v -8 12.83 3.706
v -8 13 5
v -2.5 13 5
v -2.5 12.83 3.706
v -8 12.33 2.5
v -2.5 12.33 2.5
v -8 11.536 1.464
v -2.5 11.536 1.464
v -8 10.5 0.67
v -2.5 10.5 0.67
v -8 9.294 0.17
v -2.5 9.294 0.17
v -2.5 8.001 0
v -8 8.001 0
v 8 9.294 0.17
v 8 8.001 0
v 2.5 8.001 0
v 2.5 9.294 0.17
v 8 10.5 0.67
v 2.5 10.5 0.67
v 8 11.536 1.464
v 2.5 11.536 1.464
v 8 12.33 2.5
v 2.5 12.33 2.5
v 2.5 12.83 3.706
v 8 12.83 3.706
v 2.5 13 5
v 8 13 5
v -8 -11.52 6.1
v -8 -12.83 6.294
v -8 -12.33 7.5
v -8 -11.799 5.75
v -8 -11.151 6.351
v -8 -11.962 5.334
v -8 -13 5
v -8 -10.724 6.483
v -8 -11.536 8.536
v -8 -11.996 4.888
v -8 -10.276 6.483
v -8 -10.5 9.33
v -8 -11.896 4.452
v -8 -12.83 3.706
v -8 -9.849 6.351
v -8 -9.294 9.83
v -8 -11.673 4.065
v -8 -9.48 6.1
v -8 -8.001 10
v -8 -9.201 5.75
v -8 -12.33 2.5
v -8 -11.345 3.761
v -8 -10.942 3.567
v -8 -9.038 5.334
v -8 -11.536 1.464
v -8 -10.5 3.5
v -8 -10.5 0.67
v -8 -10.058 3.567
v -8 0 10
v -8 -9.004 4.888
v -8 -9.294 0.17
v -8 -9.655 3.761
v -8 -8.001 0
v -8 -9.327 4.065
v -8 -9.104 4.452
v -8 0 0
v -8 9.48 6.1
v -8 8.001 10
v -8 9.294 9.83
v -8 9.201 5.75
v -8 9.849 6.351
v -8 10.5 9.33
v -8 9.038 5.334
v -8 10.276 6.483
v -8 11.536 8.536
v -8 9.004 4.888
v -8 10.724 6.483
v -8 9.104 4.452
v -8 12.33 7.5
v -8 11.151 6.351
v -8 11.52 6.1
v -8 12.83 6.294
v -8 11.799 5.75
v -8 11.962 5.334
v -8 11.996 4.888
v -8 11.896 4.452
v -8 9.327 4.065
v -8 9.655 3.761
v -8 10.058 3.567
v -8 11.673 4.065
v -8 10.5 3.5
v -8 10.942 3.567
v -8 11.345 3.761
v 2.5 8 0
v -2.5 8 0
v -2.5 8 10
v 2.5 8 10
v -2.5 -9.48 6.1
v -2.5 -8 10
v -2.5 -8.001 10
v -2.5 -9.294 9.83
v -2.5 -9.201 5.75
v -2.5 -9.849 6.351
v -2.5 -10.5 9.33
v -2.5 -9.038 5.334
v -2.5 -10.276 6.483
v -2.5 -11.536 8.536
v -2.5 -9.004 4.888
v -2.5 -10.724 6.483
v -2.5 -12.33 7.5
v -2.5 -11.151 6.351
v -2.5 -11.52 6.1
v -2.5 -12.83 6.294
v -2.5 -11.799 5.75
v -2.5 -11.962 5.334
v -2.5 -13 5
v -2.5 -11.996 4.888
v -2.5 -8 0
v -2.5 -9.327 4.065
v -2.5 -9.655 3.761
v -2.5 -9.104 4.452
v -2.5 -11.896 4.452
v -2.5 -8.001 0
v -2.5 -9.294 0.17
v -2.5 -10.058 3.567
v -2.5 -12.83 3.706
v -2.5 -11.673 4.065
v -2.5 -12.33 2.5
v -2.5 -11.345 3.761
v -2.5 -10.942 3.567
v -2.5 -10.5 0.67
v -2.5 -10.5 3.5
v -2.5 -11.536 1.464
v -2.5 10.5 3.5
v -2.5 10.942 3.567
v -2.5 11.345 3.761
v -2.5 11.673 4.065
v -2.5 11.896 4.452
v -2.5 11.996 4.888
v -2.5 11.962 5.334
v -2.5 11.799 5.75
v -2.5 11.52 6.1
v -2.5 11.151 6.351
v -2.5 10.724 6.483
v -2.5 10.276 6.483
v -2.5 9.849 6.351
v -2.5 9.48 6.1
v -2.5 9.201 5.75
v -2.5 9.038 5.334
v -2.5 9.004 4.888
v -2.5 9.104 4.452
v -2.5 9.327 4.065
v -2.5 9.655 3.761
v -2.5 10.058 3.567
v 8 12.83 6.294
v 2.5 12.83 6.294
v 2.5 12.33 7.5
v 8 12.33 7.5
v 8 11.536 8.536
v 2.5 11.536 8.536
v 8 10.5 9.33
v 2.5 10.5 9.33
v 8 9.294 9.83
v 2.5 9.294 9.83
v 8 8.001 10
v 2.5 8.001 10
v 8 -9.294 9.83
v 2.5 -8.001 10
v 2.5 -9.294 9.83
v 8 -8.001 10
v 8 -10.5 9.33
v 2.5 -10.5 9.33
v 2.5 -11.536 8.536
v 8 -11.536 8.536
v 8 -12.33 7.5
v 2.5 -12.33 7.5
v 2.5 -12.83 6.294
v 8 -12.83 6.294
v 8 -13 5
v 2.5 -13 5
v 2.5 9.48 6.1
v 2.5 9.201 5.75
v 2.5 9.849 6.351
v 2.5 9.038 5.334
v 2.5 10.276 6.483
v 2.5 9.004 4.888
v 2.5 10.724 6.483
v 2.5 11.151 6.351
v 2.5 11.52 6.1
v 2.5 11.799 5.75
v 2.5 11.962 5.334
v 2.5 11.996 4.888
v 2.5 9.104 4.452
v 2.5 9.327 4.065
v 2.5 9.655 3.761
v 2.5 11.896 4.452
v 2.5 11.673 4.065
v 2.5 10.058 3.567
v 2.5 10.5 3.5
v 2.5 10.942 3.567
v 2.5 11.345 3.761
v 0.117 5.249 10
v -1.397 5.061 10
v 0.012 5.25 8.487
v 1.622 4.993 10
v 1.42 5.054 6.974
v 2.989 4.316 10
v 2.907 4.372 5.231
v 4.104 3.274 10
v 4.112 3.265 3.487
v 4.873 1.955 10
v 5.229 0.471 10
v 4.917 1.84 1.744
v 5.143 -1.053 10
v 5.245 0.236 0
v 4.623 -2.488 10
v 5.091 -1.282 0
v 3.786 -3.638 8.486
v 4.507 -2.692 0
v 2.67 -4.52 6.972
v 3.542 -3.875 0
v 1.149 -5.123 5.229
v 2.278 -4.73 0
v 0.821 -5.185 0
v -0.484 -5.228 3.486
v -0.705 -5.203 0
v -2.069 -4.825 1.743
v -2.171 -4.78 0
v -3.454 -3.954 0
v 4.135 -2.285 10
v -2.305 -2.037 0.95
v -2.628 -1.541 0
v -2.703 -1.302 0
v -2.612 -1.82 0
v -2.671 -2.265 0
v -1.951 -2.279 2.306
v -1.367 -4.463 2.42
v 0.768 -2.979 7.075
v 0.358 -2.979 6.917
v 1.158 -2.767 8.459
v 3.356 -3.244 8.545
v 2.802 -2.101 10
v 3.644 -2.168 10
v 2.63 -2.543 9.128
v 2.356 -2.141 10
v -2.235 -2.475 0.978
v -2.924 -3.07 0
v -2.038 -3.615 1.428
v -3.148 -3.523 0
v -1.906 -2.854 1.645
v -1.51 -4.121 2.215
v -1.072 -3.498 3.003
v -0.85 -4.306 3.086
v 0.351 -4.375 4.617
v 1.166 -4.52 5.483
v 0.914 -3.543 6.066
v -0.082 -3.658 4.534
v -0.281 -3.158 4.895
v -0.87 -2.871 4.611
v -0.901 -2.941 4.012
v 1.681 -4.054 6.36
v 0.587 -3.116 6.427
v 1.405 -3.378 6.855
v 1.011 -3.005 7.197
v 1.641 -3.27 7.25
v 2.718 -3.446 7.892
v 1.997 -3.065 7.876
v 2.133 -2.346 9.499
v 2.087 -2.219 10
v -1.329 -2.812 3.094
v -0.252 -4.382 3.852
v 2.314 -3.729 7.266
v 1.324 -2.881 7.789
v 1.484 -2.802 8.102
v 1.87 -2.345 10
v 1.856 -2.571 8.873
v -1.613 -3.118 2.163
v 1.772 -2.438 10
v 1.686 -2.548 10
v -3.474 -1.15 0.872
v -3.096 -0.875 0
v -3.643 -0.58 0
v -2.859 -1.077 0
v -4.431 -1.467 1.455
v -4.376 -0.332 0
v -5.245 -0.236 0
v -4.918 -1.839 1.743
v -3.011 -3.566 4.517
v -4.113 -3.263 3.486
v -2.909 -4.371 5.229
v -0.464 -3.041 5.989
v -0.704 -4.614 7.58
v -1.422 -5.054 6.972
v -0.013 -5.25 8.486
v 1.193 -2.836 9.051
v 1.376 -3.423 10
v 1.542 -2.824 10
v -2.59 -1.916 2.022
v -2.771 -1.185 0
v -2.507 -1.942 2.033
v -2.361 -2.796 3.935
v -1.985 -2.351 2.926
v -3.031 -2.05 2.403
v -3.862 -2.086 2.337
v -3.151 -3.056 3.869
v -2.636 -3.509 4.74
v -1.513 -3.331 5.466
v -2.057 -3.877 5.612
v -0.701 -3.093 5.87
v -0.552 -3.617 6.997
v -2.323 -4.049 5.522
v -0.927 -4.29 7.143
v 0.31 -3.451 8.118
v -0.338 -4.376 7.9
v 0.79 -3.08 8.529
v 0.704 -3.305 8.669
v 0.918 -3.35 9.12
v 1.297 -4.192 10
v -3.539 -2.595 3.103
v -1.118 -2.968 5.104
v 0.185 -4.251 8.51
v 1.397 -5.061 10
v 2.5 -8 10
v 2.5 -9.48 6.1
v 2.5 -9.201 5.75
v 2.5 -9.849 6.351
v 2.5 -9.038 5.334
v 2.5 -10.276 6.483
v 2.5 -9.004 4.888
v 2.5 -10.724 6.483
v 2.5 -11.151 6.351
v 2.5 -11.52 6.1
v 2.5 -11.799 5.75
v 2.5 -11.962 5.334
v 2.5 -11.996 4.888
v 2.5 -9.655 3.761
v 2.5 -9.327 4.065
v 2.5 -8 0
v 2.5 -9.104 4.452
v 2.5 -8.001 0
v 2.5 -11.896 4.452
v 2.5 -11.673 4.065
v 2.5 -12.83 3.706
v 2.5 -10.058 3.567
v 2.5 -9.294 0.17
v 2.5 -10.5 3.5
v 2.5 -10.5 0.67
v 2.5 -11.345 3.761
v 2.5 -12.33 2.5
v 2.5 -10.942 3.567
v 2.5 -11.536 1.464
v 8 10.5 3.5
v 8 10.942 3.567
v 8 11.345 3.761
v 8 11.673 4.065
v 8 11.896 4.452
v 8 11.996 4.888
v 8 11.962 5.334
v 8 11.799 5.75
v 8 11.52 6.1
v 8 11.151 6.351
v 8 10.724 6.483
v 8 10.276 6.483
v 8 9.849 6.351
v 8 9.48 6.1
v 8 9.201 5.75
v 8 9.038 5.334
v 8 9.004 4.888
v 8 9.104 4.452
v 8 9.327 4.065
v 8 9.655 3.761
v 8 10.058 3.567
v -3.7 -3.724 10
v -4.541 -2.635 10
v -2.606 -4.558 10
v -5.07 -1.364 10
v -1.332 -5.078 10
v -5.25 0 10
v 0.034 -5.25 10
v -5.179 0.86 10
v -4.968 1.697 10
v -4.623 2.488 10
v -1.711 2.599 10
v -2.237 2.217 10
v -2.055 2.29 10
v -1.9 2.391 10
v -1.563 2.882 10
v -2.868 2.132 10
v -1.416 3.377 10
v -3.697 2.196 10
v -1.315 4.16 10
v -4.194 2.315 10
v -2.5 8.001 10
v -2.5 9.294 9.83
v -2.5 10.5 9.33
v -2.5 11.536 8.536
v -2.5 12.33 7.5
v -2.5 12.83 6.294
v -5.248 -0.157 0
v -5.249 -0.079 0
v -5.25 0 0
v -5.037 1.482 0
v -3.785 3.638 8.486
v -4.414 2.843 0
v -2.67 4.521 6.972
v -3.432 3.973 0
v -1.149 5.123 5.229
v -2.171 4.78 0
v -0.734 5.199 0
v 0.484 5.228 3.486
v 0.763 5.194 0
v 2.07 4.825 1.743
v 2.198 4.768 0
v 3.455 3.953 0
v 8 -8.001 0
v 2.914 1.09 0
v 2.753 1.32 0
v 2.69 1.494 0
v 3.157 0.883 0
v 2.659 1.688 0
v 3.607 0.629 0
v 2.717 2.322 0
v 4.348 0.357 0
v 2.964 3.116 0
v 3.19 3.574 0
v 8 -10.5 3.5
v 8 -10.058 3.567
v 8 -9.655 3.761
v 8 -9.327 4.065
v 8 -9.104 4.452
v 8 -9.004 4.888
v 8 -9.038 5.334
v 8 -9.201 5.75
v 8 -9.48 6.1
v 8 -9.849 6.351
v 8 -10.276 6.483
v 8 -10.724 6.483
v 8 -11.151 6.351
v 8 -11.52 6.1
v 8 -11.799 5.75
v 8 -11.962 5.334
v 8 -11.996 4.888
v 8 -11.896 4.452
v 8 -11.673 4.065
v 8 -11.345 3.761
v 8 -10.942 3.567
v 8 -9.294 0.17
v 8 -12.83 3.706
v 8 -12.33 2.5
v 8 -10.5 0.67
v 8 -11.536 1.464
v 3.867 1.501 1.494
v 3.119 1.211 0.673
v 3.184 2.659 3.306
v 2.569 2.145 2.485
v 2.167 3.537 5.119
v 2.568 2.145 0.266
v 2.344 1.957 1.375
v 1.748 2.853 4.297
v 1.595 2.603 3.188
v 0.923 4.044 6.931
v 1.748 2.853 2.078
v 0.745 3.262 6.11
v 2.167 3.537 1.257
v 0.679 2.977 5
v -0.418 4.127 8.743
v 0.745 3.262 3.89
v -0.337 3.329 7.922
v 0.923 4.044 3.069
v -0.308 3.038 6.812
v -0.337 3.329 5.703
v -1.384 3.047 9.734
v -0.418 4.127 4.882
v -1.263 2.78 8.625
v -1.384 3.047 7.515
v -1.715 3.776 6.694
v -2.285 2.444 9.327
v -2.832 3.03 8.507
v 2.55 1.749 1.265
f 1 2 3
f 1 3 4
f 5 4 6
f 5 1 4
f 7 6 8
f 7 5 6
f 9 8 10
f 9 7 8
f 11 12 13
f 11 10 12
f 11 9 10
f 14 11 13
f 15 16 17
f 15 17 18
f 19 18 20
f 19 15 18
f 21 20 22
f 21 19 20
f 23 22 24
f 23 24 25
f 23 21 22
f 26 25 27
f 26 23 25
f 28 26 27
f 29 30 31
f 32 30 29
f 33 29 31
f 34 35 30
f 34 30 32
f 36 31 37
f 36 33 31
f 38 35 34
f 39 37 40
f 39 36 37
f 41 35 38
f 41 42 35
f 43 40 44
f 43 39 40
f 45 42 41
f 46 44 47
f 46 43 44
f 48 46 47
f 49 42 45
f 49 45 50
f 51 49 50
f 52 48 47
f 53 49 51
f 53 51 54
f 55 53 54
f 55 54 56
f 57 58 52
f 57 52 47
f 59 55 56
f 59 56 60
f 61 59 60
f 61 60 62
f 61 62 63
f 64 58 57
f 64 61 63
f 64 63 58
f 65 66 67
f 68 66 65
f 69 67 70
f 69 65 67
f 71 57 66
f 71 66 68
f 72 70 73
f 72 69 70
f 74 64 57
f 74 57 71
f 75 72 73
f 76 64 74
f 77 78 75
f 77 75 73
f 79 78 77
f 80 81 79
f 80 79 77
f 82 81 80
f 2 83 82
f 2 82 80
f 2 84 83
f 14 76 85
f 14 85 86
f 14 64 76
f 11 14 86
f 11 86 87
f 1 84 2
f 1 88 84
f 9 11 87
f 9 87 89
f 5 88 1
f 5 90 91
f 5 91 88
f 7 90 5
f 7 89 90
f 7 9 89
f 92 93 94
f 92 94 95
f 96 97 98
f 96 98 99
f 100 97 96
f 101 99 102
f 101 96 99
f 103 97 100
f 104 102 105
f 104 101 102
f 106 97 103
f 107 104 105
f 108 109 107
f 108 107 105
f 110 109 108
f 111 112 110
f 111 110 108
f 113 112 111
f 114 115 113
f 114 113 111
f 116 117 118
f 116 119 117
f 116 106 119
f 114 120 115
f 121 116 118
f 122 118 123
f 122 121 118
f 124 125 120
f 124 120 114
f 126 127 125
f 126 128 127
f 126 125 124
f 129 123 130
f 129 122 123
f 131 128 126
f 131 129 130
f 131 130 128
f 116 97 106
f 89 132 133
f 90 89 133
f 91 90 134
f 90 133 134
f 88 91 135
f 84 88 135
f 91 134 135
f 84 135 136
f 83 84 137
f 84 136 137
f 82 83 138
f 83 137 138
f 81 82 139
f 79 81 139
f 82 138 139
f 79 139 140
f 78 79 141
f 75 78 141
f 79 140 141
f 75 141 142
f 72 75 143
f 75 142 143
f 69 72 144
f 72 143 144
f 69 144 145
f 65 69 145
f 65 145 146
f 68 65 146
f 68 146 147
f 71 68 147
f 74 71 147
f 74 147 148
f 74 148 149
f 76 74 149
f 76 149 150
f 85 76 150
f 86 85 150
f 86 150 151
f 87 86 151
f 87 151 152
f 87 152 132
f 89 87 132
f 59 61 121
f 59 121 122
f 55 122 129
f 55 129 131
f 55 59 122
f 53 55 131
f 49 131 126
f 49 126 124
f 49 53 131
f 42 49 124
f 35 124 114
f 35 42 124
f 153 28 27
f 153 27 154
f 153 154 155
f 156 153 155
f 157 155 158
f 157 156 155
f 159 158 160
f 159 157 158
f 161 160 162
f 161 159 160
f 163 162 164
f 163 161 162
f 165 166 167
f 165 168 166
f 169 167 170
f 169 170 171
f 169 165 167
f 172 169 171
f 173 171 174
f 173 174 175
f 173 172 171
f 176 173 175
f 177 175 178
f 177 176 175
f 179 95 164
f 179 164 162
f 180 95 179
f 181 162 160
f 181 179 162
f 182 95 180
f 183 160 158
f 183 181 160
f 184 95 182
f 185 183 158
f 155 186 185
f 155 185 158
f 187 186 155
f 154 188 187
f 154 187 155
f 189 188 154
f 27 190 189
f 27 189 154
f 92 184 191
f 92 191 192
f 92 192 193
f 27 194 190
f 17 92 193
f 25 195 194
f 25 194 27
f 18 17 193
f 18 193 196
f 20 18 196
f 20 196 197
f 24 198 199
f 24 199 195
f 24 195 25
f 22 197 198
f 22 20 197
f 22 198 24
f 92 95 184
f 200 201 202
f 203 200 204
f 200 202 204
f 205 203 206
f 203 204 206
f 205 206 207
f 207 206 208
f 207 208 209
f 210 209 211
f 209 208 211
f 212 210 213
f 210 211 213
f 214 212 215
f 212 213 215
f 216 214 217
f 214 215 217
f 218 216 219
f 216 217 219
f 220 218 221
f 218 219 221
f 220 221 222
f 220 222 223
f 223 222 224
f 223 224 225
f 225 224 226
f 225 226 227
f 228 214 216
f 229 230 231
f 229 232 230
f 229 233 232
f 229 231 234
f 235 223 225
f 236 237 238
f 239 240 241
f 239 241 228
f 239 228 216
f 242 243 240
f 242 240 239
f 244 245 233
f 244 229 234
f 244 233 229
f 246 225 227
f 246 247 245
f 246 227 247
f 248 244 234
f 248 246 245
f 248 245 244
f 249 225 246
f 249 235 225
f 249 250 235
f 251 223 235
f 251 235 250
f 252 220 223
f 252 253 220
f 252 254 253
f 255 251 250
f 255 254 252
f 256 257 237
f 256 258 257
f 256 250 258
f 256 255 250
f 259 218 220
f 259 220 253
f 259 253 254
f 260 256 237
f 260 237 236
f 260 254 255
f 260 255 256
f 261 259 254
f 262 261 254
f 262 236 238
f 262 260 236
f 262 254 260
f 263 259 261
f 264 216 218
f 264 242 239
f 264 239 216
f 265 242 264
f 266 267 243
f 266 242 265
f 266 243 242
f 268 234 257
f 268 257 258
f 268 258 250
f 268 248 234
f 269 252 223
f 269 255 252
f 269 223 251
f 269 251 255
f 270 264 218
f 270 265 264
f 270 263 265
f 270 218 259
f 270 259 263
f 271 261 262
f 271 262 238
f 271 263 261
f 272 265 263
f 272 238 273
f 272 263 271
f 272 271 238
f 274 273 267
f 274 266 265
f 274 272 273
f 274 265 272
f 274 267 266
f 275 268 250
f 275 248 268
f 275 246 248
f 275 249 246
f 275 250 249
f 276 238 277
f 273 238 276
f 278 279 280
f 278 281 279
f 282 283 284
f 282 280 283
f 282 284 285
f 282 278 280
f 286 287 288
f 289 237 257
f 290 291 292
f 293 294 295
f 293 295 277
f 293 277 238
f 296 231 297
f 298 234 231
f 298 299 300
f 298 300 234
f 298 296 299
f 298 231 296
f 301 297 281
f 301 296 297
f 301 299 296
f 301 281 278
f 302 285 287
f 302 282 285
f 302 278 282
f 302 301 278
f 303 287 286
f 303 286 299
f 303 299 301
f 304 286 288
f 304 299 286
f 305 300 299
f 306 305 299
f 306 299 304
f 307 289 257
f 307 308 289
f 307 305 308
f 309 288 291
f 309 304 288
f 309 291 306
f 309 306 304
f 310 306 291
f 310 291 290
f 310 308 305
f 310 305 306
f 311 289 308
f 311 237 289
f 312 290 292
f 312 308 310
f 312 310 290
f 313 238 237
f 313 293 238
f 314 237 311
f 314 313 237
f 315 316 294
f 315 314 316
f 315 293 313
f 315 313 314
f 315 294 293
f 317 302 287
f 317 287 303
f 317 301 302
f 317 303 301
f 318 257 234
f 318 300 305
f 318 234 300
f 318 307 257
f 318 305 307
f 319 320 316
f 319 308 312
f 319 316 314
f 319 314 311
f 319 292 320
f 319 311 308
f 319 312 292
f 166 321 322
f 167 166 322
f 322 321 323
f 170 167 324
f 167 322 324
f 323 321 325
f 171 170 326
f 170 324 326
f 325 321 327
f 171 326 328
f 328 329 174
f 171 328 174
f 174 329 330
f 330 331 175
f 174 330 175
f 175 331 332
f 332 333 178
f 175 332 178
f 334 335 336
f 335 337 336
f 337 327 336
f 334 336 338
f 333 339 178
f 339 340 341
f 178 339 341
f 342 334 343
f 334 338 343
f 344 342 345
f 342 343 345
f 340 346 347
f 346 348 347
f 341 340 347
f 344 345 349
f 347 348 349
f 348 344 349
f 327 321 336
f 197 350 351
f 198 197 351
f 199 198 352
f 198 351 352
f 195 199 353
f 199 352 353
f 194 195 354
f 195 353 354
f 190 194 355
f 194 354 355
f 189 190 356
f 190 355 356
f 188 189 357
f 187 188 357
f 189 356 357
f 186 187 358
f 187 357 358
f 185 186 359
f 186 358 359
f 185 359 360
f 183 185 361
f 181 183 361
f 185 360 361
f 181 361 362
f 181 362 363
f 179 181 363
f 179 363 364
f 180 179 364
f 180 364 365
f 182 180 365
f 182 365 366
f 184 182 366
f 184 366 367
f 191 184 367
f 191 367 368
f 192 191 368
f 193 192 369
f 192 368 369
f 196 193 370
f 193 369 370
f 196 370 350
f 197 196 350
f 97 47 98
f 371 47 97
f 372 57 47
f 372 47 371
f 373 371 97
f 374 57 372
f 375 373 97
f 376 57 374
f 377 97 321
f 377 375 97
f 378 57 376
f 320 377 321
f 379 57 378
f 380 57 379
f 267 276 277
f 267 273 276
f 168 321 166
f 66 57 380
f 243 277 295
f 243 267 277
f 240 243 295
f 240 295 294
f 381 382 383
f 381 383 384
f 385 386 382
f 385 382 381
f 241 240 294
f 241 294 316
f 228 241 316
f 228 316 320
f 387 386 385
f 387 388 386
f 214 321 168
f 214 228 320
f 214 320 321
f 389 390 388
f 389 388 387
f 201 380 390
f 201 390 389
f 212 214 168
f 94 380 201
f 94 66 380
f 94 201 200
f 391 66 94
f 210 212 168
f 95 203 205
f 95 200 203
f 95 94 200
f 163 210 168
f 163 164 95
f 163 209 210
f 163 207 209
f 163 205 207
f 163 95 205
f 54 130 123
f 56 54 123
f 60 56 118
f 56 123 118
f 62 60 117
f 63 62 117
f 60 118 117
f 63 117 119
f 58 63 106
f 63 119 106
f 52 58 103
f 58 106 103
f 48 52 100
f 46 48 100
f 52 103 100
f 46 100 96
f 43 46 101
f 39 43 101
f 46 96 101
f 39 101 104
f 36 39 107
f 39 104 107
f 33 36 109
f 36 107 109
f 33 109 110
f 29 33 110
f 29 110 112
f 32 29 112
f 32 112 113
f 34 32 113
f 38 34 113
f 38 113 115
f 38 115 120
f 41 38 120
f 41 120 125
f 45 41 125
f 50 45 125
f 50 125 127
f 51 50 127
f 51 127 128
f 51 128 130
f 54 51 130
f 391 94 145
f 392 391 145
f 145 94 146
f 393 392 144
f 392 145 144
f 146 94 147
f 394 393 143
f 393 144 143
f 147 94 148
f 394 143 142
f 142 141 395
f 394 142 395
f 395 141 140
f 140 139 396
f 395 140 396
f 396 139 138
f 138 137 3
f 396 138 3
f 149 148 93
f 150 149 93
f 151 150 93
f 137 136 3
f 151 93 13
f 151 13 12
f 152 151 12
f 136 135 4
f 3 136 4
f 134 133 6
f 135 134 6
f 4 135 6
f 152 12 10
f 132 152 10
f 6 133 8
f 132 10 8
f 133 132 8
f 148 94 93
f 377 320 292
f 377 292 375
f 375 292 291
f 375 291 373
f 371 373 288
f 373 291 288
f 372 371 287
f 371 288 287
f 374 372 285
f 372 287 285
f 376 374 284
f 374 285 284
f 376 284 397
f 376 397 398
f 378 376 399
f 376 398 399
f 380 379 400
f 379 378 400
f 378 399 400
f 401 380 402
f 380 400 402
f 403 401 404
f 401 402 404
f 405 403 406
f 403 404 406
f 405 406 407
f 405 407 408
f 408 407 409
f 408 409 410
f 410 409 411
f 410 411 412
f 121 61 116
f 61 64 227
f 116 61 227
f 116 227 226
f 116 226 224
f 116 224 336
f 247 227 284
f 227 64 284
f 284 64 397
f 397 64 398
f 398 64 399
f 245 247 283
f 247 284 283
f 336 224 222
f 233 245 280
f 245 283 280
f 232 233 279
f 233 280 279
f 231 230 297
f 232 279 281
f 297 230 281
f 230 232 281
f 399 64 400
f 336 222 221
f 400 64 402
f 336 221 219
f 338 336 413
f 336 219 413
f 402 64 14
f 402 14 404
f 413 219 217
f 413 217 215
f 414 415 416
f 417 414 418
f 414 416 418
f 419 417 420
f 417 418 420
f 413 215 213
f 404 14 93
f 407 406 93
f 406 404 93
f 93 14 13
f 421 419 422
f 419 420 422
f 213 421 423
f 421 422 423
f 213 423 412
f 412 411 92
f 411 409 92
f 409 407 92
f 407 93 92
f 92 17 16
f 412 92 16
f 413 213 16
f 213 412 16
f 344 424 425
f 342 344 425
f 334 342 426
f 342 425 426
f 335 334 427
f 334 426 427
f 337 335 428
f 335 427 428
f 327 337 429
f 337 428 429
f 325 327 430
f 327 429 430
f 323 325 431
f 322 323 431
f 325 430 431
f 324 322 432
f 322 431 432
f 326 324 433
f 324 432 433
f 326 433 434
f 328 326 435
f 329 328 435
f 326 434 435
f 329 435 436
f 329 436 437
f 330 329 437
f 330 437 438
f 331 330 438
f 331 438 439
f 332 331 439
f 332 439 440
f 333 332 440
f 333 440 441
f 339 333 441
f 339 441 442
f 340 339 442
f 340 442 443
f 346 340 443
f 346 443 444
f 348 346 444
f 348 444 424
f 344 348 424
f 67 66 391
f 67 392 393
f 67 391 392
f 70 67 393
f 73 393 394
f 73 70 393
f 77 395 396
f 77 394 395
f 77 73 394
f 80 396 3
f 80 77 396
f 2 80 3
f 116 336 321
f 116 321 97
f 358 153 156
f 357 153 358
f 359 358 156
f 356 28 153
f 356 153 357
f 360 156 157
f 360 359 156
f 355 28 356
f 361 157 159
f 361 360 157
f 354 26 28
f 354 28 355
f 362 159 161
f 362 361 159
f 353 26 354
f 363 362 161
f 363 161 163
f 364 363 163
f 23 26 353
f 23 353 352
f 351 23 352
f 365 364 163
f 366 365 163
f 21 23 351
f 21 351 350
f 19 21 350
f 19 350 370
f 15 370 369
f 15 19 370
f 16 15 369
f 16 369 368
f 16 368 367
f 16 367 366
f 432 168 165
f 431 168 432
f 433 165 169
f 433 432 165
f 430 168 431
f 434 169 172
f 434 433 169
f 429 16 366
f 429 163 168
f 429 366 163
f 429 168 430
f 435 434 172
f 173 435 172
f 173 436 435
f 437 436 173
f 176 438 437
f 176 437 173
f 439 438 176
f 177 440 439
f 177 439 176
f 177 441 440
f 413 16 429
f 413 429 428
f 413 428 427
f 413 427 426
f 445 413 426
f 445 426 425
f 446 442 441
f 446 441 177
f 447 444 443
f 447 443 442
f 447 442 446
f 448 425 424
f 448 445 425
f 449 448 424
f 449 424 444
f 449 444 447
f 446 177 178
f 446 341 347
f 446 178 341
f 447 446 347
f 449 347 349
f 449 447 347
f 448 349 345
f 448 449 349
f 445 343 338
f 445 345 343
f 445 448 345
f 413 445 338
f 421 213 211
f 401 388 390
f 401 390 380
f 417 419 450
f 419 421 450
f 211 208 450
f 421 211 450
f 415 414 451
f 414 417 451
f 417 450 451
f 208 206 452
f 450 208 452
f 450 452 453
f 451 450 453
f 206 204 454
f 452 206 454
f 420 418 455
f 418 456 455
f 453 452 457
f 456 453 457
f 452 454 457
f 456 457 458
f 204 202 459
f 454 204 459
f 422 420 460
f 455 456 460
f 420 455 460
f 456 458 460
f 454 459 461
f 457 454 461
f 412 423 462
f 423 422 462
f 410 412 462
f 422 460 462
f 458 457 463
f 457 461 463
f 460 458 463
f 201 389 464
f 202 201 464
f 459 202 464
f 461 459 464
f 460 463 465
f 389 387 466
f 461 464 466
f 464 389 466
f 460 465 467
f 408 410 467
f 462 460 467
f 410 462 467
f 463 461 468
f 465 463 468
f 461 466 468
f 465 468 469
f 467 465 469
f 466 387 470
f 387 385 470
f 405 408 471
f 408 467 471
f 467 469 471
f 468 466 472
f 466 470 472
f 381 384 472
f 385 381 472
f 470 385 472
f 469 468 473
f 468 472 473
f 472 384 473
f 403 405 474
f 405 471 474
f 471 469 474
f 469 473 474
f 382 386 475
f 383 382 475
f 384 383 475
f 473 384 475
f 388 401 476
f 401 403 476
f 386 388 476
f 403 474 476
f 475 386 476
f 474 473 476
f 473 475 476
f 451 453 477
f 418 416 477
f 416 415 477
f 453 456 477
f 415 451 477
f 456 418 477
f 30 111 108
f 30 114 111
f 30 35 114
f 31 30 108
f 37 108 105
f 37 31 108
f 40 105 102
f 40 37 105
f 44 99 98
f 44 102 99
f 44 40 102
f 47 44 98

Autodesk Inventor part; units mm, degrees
ref_plane "YZ Plane" through (0, 0, 0) normal (1, 0, 0) x (0, 1, 0)
ref_plane "XZ Plane" through (0, 0, 0) normal (0, 1, 0) x (-1, 0, 0)
ref_plane "XY Plane" through (0, 0, 0) normal (0, 0, 1) x (1, 0, 0)
sketch "Sketch1" plane through (0, 0, 0) normal (0, 0, 1) x (1, 0, 0)
  circle A0 centre (0, 0) radius 5.25
  line L0 (0, 0) -> (-8, 0)
  line L1 (-8, 0) -> (-8, 8)
  line L2 (-8, 8) -> (8, 8)
  line L3 (8, 8) -> (8, -8)
  line L4 (8, -8) -> (-8, -8)
  line L5 (-8, -8) -> (-8, 0)
  line L6 (0, -8) -> (-2.5, -8)
  line L7 (-2.5, -8) -> (-2.5, -13)
  line L8 (-2.5, -13) -> (-8, -13)
  line L9 (-8, -13) -> (-8, -8)
  line L10 (0, -8) -> (2.5, -8)
  line L11 (2.5, -8) -> (2.5, -13)
  line L12 (2.5, -13) -> (8, -13)
  line L13 (8, -13) -> (8, -8)
  line L14 (8, 0) -> (8, -2.5)
  line L15 (8, 0) -> (8, 2.5)
  line L16 (13, -2.5) -> (13, -8)
  line L17 (13, -8) -> (8, -8)
  line L18 (13, 2.5) -> (13, 8)
  line L19 (13, 8) -> (8, 8)
  line L20 (8, 2.5) -> (13, 2.5)
  line L21 (8, -2.5) -> (13, -2.5)
  line L22 (8, 8) -> (8, -8)
  line L23 (0, 8) -> (2.5, 8)
  line L24 (0, 8) -> (-2.5, 8)
  line L25 (2.5, 13) -> (8, 13)
  line L26 (8, 13) -> (8, 8)
  line L27 (-2.5, 13) -> (-8, 13)
  line L28 (-8, 13) -> (-8, 8)
  line L29 (-2.5, 8) -> (-2.5, 13)
  line L30 (2.5, 8) -> (2.5, 13)
  line L31 (-8, 8) -> (8, 8)
  line L32 (-8, 0) -> (-8, 2.5)
  line L33 (-8, 0) -> (-8, -2.5)
  line L34 (-13, 2.5) -> (-13, 8)
  line L35 (-13, 8) -> (-8, 8)
  line L36 (-13, -2.5) -> (-13, -8)
  line L37 (-13, -8) -> (-8, -8)
  line L38 (-8, -2.5) -> (-13, -2.5)
  line L39 (-8, 2.5) -> (-13, 2.5)
  line L40 (-8, -8) -> (-8, 8)
  dimension "d0" = 10.5
  dimension "d1" = 8
  dimension "d2" = 8
  dimension "d3" = 16
  dimension "d4" = 16
  dimension "d5" = 16
  dimension "d33" = 2.5
  dimension "d34" = 5
  dimension "d35" = 2.5
  dimension "d38" = 360
extrude "Extrusion1" add sketch "Sketch1" along normal blind 10 contours L1 L2 L3 L4 L5 | L28 L27 L29 L2 | L4 L7 L8 L9 | L30 L25 L26 L2 | L4 L13 L12 L11
ref_plane "Work Plane1" through (-8, 0, 0) normal (0, -1, 0) x (1, 0, 0)
sketch "Sketch3" plane through (-8, 0, 0) normal (0, -1, 0) x (1, 0, 0)
  line L0 (13.3034, 0) -> (13.3034, -2.5)
  line L1 (2.75, 0) -> (2.75, 10) projected
  line L2 (2.75, 0) -> (2.75, -2.5)
  circle A0 centre (13.3034, -2.5) radius 2.25
  circle A1 centre (2.75, -2.5) radius 2.25
  point P0 (8, 0)
  dimension "d9" = 2.5
  dimension "d10" = 2.5
  dimension "d11" = 4.5
  dimension "d12" = 4.5
coil "Coil1" sketch "Sketch3" operation add axis through (0, 0, -10) along (0, 0, 1) pitch 35 turns 1 hand right contours A1
coil "Coil2" sketch "Sketch3" operation add axis through (0, 0, -10) along (0, 0, 1) pitch 35 turns 1 hand right contours A0
sketch "Sketch4" plane through (-8, -8, 0) normal (0, -1, 0) x (1, 0, 0)
  line L0 (10.5, 10) -> (5.5, 10) projected
  line L1 (0, 10) -> (16, 10)
  line L2 (16, 10) -> (16, 40)
  line L3 (16, 40) -> (0, 40)
  line L4 (0, 40) -> (0, 10)
  line L5 (10.5, 0) -> (5.5, 0) projected
  line L6 (0, 0) -> (16, 0)
  line L7 (16, 0) -> (16, -15)
  line L8 (16, -15) -> (0, -15)
  line L9 (0, -15) -> (0, 0)
  point P0 (8, 0)
  point P1 (16, 0)
  dimension "d29" = 30
  dimension "d30" = 15
extrude "Extrusion2" cut sketch "Sketch4" against normal through all
fillet "Fillet1" radius 5 8 edges at (5.25, -13, 10) (-5.25, -13, 10) (-5.25, 13, 10) (5.25, 13, 10) (-5.25, 13, 0) (5.25, 13, 0) (-5.25, -13, 0) (5.25, -13, 0)
sketch "Sketch6" plane through (8, -8, 0) normal (1, 0, 0) x (0, 0, -1)
  arc A0 (-10, 0) -> (0, 0) centre (-5, 0) ccw projected
  line L0 (-5, -5) -> (-5, -2.5)
  circle A1 centre (-5, -2.5) radius 1.5
  arc A2 (0, 16) -> (-10, 16) centre (-5, 16) ccw projected
  line L1 (-5, 21) -> (-5, 18.5)
  circle A3 centre (-5, 18.5) radius 1.5
  point P0 (0, 8)
  dimension "d41" = 2.5
  dimension "d42" = 3
  dimension "d43" = 2.5
  dimension "d44" = 3
extrude "Extrusion3" cut sketch "Sketch6" against normal through all
equation "\"d2\" = d1"
equation "\"d3\" = 2 * d1"
equation "\"d4\" = d3"
equation "\"d5\" = d3"
properties part number "screw_nut"
